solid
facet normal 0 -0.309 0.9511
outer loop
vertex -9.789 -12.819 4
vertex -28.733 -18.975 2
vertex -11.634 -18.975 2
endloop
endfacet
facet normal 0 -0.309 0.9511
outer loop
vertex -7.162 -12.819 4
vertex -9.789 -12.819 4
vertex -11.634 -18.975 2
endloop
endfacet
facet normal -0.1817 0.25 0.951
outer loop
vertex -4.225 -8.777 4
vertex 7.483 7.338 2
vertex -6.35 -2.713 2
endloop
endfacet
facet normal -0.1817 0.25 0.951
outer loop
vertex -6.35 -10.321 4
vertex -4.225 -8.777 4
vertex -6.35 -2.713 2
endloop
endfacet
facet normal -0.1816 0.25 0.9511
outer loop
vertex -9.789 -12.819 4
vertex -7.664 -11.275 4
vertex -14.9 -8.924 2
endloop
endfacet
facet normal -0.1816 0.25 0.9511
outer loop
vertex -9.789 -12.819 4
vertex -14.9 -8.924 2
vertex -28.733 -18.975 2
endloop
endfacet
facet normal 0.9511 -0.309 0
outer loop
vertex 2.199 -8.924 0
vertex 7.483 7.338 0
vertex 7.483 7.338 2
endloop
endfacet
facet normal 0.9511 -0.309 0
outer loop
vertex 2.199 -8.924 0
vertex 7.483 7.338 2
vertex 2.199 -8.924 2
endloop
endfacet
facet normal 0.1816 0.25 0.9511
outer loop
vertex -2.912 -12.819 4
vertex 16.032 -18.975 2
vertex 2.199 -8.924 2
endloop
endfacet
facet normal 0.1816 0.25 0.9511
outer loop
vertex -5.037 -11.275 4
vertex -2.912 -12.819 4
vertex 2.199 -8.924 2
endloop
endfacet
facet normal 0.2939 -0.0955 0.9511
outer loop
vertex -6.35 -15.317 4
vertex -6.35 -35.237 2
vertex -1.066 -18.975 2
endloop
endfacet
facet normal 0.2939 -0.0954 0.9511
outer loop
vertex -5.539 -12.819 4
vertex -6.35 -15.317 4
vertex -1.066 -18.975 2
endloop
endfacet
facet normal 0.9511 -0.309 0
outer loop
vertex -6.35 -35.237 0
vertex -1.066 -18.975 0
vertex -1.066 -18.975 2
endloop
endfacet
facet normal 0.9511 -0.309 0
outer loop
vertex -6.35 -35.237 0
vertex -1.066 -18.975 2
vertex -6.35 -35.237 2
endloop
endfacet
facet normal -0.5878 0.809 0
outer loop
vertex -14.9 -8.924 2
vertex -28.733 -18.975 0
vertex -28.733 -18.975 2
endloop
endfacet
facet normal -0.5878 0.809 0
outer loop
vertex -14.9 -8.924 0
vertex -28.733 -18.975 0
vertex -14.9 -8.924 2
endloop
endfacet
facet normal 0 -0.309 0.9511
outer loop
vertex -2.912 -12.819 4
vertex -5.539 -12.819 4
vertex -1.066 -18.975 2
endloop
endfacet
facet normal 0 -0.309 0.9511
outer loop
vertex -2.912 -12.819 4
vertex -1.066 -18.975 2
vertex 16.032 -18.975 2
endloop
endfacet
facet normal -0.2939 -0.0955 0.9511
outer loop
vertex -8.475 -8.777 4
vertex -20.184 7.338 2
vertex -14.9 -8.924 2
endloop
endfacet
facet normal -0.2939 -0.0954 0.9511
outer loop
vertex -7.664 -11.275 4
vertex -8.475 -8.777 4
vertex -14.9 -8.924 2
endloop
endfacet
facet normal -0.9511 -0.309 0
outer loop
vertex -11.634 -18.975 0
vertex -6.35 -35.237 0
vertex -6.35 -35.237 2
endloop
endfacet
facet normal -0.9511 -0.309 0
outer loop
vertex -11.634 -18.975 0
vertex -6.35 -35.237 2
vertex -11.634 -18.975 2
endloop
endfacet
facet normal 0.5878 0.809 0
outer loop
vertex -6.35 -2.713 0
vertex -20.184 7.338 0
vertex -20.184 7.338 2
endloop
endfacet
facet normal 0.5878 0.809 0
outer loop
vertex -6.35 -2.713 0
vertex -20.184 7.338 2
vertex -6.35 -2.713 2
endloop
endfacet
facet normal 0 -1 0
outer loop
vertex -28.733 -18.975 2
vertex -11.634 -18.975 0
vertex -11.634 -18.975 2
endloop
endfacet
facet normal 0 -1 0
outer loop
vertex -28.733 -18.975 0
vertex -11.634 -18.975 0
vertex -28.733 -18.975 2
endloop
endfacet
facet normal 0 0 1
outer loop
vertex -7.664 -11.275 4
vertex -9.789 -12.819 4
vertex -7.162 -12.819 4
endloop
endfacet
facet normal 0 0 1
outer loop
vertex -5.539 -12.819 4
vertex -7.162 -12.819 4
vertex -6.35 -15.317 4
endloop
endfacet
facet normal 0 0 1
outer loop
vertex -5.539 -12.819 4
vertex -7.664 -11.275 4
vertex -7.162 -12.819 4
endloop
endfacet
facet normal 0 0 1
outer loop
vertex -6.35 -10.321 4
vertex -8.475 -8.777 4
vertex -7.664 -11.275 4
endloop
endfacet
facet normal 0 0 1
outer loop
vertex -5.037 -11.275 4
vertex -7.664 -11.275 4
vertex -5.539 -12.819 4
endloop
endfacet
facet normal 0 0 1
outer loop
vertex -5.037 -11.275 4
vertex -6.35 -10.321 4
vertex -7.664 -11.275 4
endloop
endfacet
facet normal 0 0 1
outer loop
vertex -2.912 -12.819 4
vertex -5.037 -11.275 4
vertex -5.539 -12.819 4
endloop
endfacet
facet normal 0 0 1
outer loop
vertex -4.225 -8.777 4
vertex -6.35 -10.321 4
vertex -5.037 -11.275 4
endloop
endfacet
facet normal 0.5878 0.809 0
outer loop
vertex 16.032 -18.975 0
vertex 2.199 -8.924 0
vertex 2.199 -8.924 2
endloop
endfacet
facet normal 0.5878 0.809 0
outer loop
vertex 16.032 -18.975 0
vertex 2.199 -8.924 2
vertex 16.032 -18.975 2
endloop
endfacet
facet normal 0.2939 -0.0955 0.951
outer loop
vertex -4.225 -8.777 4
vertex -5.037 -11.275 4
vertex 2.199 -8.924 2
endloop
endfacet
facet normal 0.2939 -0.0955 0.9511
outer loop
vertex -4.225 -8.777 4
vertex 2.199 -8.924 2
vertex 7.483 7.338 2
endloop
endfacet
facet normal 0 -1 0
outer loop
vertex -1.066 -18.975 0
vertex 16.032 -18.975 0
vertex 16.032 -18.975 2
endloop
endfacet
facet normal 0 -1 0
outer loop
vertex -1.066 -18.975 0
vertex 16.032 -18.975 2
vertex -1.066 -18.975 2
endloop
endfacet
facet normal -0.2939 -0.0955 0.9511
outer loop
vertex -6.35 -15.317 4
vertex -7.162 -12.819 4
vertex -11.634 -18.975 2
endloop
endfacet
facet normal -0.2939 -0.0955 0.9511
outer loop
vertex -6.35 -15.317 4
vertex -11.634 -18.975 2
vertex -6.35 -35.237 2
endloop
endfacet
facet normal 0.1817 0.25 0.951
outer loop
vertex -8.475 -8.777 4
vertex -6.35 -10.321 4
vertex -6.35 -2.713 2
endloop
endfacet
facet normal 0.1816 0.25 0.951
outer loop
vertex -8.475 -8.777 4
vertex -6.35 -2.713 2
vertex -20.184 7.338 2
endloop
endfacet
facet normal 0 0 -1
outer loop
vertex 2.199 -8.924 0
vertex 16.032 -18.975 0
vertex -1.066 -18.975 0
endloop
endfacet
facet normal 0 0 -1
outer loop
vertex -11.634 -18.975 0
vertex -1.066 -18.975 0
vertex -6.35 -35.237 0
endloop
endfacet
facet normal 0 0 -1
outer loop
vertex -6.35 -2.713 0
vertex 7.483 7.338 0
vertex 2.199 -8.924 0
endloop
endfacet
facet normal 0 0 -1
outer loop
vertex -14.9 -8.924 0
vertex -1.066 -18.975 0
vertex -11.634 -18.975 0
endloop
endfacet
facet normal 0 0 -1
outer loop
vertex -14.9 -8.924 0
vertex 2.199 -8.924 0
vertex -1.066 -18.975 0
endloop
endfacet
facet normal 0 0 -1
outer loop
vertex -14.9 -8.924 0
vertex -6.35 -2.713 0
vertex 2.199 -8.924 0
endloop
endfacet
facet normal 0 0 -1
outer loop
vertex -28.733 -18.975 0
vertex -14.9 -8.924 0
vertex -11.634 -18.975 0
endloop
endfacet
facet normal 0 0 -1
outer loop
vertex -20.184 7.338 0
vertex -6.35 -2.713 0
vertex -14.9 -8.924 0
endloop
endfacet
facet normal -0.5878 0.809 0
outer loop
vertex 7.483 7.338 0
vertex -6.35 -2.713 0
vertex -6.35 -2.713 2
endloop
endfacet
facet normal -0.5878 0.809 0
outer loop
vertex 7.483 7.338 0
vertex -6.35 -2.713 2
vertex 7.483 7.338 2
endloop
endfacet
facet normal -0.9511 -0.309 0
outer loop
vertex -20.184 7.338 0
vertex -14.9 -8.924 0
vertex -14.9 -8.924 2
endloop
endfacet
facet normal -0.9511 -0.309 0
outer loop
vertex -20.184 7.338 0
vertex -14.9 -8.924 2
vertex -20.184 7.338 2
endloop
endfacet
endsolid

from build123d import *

# Parameters (mm, degrees)
SALIENTE_EXTRUIR1_DEPTH = 2
SALIENTE_EXTRUIR2_DEPTH = 2
SALIENTE_EXTRUIR2_DRAFT = 72


with BuildPart() as part:
    # Croquis1 → Saliente-Extruir1 (new body)
    with BuildSketch(Plane.XY):
        Polygon((-6.350280368, -35.236671251), (-11.634129822, -18.974654774), (-28.733025837, -18.974654774), (-14.899728375, -8.924175866), (-20.183577829, 7.337840611), (-6.350280368, -2.712638297), (7.483017094, 7.337840611), (2.19916764, -8.924175866), (16.032465101, -18.974654774), (-1.066430914, -18.974654774), align=None)
    extrude(amount=SALIENTE_EXTRUIR1_DEPTH)


with BuildPart() as saliente_extruir2_tool:
    # Croquis2 → Saliente-Extruir2 (with draft: the straight prism first)
    with BuildSketch(Plane.XY.offset(2)):
        Polygon((-14.899728375, -8.924175866), (-28.733025837, -18.974654774), (-11.634129822, -18.974654774), (-6.350280368, -35.236671251), (-1.066430914, -18.974654774), (16.032465101, -18.974654774), (2.19916764, -8.924175866), (7.483017094, 7.337840611), (-6.350280368, -2.712638297), (-20.183577829, 7.337840611), align=None)
    extrude(amount=SALIENTE_EXTRUIR2_DEPTH)
    # Saliente-Extruir2: the draft: its side faces are tilted about the plane it starts from
    saliente_extruir2_sides = [saliente_extruir2_tool.faces().sort_by_distance(p)[0] for p in [
        (-17.541653102, -0.793167627, 3),
        (-21.816377106, -13.94941532, 3),
        (-20.183577829, -18.974654774, 3),
        (-8.992205095, -27.105663013, 3),
        (-3.708355641, -27.105663013, 3),
        (7.483017094, -18.974654774, 3),
        (9.115816371, -13.94941532, 3),
        (4.841092367, -0.793167627, 3),
        (0.566368363, 2.312601157, 3),
        (-13.266929099, 2.312601157, 3),
    ]]
    draft(saliente_extruir2_sides, Plane.XY.offset(2), SALIENTE_EXTRUIR2_DRAFT)


with BuildPart() as part_1:
    add(part.part)

    # Saliente-Extruir2: add saliente_extruir2_tool
    add(saliente_extruir2_tool.part)


solid = part_1.part
